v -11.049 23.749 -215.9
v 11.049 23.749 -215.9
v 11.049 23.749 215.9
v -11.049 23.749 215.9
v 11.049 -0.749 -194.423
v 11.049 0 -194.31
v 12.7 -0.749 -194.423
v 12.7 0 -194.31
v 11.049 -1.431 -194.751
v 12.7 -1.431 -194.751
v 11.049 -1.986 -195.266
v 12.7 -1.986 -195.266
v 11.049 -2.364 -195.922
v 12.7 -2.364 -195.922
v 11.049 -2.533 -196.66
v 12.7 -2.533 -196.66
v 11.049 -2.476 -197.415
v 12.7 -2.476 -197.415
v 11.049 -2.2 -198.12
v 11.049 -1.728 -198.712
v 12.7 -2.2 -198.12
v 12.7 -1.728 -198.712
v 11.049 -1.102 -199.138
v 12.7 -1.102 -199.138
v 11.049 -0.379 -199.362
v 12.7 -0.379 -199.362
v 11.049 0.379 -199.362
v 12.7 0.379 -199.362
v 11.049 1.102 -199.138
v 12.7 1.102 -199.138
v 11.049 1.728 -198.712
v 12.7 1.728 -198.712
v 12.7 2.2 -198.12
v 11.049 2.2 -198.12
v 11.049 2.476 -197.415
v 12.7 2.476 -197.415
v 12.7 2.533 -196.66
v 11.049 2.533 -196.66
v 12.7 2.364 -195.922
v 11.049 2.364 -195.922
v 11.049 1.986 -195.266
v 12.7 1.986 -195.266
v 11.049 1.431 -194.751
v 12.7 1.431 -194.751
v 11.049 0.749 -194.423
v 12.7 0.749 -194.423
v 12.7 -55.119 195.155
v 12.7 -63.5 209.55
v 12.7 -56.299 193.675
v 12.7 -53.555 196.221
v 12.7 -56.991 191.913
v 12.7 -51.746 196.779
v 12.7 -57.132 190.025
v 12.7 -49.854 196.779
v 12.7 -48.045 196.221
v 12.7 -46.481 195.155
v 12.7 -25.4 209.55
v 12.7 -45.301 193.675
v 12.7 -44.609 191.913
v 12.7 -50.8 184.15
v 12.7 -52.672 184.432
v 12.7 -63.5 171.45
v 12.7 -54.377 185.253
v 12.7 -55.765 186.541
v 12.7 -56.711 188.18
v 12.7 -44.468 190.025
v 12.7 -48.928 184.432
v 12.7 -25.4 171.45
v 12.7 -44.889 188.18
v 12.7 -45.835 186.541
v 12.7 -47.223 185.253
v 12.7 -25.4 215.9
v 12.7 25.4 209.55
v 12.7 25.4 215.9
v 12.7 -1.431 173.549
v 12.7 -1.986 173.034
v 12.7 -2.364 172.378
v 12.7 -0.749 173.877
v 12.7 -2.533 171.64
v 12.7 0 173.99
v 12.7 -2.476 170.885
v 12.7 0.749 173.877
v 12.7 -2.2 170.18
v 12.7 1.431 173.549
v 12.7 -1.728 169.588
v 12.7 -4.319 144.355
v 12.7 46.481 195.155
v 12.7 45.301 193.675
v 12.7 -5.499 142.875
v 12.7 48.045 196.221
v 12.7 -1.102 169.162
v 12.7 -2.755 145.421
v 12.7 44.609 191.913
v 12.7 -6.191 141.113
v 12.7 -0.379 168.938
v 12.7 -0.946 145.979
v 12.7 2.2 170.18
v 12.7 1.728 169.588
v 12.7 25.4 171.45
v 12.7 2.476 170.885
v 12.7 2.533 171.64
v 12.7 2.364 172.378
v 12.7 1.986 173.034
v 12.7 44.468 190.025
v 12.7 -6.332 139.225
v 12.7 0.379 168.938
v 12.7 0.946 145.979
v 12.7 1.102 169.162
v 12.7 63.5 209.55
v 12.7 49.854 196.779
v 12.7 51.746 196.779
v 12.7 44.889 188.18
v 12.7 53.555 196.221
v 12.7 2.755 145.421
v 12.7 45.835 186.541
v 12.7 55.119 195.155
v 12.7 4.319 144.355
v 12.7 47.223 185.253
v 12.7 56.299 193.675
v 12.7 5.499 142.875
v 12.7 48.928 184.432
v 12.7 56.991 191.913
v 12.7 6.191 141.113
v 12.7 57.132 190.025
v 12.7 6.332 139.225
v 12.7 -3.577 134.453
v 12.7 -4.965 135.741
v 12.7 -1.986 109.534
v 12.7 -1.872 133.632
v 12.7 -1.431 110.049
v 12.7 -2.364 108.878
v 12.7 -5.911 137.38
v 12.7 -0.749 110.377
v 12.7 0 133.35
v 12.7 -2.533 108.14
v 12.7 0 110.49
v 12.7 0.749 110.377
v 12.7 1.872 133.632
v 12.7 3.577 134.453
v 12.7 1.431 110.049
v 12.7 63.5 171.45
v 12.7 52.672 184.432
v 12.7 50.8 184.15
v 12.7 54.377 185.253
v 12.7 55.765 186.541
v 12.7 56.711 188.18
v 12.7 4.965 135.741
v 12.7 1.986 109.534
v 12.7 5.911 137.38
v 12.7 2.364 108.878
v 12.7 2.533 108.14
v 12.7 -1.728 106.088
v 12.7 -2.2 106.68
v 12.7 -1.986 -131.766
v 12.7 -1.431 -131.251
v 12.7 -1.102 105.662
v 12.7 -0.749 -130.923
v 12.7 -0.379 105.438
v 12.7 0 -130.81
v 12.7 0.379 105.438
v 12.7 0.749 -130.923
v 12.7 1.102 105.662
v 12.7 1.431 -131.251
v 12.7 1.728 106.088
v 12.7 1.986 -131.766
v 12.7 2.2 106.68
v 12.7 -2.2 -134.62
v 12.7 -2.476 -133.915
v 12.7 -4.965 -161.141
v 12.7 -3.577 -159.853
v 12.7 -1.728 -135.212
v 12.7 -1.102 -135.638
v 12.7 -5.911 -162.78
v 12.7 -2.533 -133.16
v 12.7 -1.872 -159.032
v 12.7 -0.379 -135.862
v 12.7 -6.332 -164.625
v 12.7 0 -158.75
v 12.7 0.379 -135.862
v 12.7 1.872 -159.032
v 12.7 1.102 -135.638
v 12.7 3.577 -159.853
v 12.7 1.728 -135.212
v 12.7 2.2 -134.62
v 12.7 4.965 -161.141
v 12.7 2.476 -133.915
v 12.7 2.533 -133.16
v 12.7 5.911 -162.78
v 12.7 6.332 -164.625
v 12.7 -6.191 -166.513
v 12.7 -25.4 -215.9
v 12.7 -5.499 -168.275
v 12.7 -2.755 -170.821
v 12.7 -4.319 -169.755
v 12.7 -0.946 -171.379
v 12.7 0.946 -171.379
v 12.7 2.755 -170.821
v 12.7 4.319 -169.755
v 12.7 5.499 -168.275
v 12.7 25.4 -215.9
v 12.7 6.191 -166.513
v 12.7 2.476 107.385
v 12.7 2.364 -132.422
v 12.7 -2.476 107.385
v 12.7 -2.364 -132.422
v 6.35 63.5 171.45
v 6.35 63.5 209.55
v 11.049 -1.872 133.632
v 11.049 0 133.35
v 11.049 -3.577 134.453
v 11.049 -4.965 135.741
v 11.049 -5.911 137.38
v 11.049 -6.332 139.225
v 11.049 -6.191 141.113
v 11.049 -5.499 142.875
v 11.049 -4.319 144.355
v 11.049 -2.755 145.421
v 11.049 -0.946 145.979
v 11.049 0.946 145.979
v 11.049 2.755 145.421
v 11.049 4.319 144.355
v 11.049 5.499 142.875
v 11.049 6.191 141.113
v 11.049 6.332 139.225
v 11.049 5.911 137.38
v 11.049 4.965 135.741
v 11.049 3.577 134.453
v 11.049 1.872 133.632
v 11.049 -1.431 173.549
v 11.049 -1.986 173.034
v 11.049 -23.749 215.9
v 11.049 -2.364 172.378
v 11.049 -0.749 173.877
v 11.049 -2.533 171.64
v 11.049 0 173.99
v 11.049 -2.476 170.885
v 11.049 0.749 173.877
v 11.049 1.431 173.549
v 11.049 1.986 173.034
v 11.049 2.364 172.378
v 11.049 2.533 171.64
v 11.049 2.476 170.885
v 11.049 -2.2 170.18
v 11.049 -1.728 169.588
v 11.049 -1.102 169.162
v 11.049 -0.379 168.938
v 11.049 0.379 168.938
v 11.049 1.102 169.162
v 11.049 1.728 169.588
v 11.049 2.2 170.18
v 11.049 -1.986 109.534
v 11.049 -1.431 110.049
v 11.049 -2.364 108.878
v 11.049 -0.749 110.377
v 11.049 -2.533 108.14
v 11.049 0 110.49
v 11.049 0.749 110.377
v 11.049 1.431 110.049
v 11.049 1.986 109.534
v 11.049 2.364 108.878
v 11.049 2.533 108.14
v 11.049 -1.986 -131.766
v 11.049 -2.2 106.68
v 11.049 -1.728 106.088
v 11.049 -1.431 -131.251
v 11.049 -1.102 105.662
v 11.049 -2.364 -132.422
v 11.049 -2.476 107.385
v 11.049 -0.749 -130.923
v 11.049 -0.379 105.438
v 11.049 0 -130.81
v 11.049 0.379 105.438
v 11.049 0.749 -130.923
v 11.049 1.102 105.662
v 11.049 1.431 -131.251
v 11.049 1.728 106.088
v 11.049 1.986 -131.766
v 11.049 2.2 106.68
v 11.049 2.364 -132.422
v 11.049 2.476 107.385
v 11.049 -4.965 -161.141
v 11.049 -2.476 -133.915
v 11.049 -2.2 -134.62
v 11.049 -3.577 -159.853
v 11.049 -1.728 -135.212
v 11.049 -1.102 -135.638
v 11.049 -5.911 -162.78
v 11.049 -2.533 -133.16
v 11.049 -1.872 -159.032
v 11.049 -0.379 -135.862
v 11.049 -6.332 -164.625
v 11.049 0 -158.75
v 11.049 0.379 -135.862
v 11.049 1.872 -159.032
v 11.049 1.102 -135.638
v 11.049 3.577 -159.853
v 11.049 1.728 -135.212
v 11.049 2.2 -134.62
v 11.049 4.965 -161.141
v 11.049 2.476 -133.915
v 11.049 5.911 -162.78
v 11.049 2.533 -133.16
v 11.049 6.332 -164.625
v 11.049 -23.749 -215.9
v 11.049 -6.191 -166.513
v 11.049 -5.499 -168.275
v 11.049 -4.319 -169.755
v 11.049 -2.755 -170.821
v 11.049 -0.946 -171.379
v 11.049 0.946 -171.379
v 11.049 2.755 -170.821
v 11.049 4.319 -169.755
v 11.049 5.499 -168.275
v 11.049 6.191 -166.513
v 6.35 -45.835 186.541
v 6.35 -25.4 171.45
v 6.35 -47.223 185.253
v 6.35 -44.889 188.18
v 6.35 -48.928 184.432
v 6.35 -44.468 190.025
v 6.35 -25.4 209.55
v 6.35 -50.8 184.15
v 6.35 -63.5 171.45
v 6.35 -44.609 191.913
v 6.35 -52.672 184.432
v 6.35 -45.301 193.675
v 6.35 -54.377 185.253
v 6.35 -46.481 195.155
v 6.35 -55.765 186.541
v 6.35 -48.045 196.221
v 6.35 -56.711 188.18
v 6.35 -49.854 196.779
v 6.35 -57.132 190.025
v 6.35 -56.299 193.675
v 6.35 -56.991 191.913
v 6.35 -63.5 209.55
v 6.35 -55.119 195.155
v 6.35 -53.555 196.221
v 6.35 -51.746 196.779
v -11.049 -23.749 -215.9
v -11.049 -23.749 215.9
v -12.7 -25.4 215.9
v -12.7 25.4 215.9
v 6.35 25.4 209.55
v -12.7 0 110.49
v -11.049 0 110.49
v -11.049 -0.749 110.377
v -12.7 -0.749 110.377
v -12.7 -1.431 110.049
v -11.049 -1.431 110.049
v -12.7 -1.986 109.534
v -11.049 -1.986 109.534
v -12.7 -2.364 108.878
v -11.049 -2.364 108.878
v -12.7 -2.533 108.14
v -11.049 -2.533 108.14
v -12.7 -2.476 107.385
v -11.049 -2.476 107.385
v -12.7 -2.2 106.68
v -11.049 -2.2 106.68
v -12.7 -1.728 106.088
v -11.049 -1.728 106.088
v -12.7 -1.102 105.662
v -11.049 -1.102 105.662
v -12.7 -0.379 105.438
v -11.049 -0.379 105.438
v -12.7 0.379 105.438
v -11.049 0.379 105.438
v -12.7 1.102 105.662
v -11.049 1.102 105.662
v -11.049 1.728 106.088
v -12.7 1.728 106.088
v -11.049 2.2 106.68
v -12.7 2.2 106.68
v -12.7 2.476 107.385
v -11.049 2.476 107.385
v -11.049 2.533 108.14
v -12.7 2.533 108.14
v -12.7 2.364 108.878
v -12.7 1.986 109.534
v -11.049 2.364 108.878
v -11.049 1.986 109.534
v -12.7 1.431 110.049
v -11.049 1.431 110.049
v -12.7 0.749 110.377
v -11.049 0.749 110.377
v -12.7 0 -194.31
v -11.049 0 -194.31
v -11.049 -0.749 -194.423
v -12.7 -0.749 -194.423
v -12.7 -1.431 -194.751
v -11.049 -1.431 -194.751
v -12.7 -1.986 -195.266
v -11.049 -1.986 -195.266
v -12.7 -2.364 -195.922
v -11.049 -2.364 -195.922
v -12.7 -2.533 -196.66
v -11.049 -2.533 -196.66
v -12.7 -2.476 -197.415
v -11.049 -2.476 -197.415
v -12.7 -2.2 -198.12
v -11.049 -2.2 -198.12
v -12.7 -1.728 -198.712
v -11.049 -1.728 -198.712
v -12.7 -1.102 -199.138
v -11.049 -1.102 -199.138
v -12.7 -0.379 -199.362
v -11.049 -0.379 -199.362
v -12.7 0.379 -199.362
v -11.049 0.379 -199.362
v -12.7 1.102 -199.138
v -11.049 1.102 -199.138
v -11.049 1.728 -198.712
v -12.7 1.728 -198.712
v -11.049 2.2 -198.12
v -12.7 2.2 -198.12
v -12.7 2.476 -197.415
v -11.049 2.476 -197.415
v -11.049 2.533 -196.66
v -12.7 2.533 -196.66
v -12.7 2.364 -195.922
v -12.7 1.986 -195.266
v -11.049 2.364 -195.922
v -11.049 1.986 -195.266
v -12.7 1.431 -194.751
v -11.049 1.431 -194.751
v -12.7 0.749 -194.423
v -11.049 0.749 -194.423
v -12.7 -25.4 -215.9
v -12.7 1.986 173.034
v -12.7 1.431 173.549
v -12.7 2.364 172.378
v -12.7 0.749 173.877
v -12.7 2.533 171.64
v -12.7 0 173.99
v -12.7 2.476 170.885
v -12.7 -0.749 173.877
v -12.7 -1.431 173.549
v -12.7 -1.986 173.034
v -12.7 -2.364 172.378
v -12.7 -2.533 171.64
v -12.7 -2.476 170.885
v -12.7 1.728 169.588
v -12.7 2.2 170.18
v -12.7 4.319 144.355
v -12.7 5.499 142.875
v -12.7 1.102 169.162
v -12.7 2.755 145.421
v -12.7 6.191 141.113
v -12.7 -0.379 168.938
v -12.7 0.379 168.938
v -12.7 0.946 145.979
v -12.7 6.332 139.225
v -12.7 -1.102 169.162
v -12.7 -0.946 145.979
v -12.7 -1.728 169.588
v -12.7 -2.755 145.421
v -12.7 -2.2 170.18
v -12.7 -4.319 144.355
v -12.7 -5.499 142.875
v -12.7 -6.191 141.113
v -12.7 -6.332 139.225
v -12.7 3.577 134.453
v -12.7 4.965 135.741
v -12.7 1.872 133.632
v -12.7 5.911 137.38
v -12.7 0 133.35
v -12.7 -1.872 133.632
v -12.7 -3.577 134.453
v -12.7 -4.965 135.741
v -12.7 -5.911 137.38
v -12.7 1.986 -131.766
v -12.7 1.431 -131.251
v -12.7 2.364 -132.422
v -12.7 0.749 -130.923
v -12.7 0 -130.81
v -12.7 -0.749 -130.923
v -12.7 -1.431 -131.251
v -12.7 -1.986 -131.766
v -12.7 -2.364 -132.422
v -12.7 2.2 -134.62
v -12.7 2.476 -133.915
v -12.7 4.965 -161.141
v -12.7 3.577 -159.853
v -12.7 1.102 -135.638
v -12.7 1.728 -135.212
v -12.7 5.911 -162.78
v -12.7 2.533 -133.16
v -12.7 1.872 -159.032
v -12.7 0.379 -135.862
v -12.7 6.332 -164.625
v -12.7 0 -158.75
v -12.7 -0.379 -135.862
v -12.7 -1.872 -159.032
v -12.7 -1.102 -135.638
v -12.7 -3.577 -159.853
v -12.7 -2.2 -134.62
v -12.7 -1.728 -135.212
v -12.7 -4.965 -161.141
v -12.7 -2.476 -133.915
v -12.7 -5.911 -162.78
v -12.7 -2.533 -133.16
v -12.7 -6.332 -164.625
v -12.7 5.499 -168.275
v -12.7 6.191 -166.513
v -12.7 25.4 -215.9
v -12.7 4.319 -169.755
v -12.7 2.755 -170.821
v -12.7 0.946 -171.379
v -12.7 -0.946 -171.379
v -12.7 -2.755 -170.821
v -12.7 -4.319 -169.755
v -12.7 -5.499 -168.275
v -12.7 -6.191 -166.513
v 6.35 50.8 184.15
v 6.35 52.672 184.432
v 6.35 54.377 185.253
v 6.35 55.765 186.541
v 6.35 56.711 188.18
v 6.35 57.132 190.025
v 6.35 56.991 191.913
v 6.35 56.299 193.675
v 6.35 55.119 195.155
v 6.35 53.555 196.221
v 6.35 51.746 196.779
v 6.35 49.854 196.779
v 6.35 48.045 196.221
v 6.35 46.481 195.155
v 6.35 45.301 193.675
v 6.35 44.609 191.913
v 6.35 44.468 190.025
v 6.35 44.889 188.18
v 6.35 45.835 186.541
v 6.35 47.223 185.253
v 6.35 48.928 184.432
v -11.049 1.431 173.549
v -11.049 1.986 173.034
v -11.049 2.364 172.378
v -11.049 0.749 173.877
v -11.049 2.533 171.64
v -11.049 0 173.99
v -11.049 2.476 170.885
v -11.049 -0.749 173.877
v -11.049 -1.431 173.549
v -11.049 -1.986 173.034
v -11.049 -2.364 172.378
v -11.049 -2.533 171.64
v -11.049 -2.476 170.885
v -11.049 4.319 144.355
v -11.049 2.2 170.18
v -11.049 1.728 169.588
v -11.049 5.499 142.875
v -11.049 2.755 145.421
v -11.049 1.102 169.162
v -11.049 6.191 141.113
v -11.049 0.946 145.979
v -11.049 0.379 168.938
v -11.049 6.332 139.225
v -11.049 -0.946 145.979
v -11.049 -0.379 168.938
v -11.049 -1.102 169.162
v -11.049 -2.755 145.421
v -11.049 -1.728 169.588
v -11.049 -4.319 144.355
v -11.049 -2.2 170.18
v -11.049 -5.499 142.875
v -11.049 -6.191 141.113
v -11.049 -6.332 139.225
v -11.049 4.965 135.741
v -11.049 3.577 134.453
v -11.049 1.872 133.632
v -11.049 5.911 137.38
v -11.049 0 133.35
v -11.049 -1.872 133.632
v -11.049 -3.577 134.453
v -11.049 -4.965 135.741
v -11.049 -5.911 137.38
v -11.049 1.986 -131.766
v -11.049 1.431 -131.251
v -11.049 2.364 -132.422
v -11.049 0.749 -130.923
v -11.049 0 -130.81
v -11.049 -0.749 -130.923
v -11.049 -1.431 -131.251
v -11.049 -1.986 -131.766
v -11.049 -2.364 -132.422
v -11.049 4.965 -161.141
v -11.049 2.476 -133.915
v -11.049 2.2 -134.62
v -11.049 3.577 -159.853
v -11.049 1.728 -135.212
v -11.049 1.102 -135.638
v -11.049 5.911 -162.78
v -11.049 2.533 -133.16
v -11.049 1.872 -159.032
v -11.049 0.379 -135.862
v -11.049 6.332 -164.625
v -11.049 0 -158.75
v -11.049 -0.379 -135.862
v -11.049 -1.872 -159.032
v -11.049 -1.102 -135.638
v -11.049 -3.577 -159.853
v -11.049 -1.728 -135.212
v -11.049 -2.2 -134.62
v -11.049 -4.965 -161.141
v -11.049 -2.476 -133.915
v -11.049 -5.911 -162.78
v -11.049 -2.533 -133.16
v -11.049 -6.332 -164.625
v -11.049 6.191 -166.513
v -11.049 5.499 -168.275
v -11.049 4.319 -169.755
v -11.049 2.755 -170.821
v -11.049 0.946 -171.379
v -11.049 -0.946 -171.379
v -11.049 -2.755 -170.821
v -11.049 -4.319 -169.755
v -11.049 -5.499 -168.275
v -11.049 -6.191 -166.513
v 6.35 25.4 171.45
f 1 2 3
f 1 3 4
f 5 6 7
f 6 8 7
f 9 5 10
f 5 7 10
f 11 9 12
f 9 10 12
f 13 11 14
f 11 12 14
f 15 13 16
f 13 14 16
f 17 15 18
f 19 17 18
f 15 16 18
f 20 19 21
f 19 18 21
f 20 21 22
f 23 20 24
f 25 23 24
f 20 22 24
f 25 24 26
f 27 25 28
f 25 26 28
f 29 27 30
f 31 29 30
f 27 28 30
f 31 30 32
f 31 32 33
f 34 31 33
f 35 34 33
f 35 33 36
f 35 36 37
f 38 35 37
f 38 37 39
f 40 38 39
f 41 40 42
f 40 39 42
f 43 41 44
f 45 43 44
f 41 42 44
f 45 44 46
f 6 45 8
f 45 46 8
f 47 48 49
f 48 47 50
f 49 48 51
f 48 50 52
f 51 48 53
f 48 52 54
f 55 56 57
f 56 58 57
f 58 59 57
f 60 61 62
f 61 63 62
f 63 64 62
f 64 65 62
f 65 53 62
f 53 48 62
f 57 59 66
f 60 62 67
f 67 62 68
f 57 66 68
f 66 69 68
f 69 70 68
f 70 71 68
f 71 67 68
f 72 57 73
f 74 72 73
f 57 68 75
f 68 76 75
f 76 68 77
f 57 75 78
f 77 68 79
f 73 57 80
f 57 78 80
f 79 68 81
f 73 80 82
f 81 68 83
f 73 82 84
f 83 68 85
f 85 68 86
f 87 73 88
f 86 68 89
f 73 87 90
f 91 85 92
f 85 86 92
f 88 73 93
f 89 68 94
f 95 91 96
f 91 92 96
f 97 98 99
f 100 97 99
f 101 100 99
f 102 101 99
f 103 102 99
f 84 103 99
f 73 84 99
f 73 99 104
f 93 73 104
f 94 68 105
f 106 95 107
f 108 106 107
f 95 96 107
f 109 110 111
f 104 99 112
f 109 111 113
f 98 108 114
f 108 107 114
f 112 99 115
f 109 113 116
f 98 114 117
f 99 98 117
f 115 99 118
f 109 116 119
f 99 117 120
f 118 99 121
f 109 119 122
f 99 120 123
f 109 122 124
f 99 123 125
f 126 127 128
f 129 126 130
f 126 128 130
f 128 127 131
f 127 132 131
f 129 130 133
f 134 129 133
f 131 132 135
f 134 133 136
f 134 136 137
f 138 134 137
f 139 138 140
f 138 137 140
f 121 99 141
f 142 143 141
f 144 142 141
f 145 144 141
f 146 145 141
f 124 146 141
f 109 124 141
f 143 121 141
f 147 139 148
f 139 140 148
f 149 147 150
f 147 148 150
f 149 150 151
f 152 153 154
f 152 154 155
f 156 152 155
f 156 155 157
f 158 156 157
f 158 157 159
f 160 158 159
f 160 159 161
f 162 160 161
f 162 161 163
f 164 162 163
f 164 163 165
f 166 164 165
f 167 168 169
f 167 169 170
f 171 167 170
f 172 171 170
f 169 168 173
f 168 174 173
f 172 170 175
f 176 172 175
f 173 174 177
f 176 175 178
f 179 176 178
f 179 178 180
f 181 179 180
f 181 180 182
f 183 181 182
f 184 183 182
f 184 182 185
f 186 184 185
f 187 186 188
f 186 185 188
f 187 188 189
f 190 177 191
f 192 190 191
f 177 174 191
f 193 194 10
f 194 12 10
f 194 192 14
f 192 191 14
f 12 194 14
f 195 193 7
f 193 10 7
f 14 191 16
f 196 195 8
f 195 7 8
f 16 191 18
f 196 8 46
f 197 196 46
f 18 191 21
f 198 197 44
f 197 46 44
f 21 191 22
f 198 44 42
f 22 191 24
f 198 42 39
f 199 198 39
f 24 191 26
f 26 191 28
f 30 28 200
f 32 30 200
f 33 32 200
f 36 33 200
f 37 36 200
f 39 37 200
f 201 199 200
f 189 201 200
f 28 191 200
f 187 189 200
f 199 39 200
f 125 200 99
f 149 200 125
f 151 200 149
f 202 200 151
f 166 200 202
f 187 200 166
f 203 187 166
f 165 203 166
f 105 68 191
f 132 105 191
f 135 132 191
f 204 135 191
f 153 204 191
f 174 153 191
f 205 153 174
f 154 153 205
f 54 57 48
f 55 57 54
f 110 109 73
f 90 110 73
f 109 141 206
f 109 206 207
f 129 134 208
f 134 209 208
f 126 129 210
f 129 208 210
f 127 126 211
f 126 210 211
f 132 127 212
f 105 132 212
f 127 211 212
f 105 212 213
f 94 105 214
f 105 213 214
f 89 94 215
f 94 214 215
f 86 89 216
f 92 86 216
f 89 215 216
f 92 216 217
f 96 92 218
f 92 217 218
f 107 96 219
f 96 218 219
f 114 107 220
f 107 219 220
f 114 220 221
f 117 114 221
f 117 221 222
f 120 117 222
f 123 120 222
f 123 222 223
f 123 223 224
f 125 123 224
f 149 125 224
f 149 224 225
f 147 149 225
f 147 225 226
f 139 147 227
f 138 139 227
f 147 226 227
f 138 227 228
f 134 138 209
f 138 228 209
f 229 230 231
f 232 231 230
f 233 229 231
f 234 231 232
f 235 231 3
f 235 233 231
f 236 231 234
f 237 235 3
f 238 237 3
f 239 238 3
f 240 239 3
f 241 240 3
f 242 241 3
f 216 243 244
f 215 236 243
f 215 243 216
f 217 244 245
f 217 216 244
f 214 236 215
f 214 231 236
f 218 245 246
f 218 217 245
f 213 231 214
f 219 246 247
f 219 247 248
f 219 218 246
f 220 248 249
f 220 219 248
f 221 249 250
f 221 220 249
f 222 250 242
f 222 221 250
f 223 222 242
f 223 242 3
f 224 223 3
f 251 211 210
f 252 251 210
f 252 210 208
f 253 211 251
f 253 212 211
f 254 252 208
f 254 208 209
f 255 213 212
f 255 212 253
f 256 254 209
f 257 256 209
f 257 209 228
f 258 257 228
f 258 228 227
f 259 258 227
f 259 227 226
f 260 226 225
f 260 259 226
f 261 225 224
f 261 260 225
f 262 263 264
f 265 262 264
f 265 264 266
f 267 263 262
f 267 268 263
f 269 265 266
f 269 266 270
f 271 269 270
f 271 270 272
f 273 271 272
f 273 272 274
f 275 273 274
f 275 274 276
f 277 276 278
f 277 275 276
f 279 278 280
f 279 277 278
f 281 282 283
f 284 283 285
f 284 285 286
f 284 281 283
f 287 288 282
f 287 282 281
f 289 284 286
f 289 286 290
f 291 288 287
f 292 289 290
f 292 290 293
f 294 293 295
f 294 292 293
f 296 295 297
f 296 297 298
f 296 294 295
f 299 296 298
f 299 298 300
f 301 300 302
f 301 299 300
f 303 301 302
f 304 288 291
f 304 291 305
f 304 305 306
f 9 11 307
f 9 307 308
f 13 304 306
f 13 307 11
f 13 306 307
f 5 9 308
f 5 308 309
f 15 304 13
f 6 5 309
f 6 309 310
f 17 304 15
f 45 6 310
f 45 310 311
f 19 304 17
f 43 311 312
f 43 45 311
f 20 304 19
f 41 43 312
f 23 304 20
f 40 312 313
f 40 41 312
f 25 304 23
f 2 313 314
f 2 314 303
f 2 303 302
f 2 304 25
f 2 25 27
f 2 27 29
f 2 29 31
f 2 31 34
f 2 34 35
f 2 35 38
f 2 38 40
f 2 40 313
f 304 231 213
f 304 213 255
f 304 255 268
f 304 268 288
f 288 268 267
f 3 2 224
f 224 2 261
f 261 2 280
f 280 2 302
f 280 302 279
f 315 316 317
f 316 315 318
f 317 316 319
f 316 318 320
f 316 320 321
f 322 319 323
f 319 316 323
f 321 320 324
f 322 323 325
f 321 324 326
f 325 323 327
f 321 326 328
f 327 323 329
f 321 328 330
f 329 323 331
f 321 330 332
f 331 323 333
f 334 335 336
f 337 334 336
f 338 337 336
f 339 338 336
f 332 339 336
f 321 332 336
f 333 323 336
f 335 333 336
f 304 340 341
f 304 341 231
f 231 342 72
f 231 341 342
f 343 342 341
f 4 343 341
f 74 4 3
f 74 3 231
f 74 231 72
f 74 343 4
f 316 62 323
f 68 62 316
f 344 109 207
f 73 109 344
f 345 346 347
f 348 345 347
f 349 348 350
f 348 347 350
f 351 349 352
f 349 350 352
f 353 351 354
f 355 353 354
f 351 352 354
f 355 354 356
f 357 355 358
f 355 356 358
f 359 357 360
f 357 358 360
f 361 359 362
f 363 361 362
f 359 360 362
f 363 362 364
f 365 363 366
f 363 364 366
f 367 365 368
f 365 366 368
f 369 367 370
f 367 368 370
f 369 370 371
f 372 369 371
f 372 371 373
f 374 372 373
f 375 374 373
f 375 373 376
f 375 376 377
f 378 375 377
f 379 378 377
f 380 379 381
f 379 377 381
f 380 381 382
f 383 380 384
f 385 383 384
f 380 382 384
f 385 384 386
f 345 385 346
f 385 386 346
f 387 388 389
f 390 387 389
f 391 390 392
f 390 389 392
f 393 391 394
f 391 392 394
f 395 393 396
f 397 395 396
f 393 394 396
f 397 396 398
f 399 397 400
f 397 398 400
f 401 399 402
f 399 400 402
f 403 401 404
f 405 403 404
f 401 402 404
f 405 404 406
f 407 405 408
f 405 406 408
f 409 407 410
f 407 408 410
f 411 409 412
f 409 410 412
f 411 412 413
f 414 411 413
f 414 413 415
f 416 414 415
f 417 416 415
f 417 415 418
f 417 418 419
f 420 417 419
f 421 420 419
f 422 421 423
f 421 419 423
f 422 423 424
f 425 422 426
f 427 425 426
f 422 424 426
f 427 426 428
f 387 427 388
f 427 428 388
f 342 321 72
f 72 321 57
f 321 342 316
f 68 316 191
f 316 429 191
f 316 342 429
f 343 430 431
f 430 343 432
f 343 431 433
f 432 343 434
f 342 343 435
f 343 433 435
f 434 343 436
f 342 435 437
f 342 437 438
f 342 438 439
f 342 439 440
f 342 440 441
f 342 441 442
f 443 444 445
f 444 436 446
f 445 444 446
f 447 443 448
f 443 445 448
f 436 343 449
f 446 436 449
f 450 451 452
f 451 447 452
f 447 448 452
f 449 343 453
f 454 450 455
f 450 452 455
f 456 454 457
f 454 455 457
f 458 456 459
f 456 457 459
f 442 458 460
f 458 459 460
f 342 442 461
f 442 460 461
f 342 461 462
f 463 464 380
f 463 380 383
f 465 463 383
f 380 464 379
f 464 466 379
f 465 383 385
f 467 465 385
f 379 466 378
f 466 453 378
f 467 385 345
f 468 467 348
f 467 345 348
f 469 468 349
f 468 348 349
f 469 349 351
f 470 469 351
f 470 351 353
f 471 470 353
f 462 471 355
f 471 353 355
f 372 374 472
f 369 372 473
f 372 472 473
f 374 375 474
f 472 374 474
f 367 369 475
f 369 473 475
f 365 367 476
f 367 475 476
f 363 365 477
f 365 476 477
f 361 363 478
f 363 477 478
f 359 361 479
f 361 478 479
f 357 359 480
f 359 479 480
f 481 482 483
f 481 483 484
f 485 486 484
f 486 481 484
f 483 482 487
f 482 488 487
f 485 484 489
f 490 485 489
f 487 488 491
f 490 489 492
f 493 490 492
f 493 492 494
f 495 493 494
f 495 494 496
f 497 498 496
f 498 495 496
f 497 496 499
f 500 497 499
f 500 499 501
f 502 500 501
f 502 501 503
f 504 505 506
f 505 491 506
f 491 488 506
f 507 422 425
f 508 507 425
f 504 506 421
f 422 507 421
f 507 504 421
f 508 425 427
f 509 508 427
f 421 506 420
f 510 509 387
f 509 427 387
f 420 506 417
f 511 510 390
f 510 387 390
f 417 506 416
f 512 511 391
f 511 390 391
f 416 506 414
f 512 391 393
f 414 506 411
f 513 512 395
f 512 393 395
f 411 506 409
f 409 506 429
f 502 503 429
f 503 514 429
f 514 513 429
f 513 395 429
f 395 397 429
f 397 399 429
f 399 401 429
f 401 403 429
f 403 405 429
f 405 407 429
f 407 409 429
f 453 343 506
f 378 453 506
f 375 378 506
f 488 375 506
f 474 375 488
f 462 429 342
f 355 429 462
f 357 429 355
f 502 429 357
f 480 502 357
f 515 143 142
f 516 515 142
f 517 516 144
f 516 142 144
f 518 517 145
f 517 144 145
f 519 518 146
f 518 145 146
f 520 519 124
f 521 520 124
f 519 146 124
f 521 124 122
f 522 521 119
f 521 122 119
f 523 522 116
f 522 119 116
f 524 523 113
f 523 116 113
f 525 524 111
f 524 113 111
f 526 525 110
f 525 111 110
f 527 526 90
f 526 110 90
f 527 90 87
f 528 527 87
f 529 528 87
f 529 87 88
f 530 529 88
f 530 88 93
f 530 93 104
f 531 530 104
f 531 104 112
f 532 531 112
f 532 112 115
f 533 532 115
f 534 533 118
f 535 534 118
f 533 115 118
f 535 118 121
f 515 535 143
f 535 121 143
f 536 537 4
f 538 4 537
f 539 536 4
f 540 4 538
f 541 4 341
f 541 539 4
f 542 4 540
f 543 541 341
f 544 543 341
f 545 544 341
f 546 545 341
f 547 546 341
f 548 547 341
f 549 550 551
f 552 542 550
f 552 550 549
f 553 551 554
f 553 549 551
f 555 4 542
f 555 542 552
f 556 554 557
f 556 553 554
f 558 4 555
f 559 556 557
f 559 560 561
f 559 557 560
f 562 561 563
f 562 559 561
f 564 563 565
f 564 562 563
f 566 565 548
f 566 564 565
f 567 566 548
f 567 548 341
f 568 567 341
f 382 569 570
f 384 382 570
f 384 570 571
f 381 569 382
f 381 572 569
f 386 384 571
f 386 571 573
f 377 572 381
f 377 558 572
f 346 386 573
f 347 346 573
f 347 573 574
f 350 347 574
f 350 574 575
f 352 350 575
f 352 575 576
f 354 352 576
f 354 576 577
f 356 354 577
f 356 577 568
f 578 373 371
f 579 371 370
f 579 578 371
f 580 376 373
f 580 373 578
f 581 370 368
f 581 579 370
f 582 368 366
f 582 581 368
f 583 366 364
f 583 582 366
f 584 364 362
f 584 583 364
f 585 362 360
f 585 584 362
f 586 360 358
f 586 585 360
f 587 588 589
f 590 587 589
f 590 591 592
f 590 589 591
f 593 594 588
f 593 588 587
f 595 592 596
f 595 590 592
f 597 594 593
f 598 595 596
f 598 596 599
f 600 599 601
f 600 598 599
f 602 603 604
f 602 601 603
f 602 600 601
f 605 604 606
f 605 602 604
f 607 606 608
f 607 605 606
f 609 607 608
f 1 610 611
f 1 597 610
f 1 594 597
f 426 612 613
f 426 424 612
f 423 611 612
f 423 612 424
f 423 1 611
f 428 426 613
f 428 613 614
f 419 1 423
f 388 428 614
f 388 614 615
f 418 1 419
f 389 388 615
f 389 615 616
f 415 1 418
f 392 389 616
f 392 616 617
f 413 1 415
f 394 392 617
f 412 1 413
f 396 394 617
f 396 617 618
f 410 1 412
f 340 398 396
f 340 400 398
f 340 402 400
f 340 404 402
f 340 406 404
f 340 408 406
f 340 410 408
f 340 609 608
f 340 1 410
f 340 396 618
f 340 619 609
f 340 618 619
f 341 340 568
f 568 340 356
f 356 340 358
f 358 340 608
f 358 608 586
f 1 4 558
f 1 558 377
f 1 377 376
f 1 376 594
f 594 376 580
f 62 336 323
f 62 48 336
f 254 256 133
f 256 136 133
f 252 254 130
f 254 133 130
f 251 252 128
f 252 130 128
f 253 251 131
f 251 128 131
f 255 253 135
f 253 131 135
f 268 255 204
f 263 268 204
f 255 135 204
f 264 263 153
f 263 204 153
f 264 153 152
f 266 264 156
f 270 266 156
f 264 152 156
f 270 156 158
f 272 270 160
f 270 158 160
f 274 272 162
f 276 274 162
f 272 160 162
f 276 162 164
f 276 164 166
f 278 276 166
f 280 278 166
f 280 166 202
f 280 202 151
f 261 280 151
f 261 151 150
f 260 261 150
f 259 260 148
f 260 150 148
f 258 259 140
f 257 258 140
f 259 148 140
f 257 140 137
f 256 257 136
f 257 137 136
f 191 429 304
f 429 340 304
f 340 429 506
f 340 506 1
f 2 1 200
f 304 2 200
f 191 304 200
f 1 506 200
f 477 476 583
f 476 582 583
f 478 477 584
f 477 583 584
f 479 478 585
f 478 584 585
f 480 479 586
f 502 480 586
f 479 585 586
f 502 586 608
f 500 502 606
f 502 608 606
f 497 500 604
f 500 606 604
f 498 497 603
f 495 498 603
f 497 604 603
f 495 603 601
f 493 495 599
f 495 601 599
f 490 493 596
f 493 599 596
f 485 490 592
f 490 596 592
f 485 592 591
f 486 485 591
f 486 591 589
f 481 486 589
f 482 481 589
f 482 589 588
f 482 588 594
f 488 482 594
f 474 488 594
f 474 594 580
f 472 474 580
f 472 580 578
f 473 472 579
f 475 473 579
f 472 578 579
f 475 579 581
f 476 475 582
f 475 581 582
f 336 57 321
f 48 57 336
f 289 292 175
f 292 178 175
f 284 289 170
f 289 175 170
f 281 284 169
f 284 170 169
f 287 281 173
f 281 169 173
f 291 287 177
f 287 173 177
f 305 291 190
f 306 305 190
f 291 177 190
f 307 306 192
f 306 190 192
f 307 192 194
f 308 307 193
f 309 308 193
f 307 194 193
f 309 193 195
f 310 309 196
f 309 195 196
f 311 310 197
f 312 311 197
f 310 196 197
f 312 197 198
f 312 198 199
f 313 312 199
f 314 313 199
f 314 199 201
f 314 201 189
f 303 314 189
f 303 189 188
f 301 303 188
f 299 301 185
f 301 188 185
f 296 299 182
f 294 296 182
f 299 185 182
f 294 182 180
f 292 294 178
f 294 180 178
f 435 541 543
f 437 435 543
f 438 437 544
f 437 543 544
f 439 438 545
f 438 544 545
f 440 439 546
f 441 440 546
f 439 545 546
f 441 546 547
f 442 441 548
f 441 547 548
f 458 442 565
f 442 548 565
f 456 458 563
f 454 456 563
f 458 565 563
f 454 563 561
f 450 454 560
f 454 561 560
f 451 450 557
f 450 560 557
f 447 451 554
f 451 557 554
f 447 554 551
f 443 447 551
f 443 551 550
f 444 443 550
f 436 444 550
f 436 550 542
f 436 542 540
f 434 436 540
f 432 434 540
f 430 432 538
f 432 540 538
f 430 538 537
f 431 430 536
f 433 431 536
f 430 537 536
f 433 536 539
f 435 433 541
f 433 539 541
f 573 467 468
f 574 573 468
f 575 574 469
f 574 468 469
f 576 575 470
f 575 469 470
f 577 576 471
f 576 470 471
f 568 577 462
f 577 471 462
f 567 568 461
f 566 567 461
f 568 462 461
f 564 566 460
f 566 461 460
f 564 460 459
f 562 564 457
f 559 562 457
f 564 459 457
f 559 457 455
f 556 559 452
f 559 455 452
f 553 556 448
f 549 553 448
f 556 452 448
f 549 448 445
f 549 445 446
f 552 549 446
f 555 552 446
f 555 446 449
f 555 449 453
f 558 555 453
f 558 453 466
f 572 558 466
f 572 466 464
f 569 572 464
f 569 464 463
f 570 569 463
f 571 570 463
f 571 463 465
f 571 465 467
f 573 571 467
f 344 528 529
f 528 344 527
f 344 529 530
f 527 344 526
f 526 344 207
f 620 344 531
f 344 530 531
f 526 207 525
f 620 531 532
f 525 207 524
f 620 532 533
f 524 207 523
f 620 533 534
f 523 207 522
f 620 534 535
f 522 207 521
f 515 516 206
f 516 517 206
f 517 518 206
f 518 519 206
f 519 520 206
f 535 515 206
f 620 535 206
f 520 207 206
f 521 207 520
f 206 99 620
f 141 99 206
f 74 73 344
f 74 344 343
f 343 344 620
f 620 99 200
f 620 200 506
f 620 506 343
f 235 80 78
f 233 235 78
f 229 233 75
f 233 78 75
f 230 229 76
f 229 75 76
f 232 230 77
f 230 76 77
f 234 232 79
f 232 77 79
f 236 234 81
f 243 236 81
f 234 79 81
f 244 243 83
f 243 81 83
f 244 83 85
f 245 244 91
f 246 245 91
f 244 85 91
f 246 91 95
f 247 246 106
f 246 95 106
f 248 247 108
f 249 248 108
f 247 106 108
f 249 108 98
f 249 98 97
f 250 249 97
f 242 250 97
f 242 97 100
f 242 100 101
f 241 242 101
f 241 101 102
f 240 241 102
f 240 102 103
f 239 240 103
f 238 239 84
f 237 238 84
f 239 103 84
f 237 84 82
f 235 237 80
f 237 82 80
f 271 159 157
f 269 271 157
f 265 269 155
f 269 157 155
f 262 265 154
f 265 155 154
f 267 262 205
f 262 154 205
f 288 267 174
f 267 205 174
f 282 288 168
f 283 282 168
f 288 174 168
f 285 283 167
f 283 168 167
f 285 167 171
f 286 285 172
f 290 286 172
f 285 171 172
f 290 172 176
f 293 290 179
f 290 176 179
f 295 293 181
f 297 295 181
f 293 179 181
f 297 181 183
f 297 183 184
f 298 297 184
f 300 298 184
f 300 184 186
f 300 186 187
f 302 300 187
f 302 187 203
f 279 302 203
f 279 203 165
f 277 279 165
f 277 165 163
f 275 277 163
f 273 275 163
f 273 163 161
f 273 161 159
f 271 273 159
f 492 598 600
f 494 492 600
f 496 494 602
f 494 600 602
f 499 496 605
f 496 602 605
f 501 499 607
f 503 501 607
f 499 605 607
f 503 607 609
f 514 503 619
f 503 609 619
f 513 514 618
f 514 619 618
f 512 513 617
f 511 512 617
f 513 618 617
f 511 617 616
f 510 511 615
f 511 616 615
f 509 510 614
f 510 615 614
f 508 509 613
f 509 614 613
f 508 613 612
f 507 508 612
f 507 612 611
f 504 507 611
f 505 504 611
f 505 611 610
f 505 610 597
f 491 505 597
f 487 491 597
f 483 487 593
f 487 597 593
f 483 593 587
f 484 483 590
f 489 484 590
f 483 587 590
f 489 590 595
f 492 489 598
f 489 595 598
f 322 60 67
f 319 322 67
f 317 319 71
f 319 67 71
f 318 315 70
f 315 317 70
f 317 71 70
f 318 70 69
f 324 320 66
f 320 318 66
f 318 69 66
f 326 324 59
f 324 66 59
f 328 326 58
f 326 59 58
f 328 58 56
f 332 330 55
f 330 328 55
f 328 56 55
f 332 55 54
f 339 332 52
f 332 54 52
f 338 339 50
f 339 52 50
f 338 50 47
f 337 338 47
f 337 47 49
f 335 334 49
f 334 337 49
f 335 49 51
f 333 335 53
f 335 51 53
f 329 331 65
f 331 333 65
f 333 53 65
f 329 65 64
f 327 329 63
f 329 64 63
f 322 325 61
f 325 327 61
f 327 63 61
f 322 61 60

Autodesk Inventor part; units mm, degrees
ref_plane "XY Plane" through (0, 0, 0) normal (0, 0, 1) x (1, 0, 0)
sketch "Sketch1" plane through (0, 0, 0) normal (0, 0, 1) x (1, 0, 0)
  line L0 (-12.7, -25.4) -> (12.7, -25.4)
  line L1 (12.7, -25.4) -> (12.7, 25.4)
  line L2 (12.7, 25.4) -> (-12.7, 25.4)
  line L3 (-12.7, 25.4) -> (-12.7, -25.4)
  line L4 (-12.7, -25.4) -> (12.7, 25.4) construction
  line L5 (12.7, -25.4) -> (-12.7, 25.4) construction
  line L6 (-11.049, -23.749) -> (11.049, -23.749)
  line L7 (11.049, -23.749) -> (11.049, 23.749)
  line L8 (11.049, 23.749) -> (-11.049, 23.749)
  line L9 (-11.049, 23.749) -> (-11.049, -23.749)
  line L10 (-11.049, -23.749) -> (11.049, 23.749) construction
  line L11 (11.049, -23.749) -> (-11.049, 23.749) construction
  point P0 (0, 0)
  dimension "d0" = 25.4
  dimension "d1" = 50.8
  dimension "d4" = 22.098
  dimension "d5" = 47.498
extrude "Extrusion2" add sketch "Sketch1" along normal mid plane 431.8
sketch "Sketch2" plane through (12.7, -25.4, 215.9) normal (1, 0, 0) x (0, 0, -1)
  line L0 (431.8, 50.8) -> (0, 50.8) projected
  line L1 (0, 0) -> (0, 50.8) projected
  line L2 (431.8, 0) -> (0, 0) projected
  line L3 (431.8, 50.8) -> (431.8, 0) projected
  point P0 (215.9, 25.4)
  point P1 (76.2, 25.4)
  dimension "d8" = 76.2
  dimension "d9" = 25.4
hole "Hole1" at (12.7, 0, 139.7) direction (-1, 0, 0) diameter 12.7 end through all
ref_plane "Work Plane1" through (-12.7, -25.4, 215.9) normal (-1, 0, 0) x (0, 0, 1)
ref_plane "Work Plane2" through (12.7, -25.4, 215.9) normal (-1, 0, 0) x (0, 0, 1)
sketch "Sketch4" plane through (-12.7, -25.4, 215.9) normal (-1, 0, 0) x (0, 0, 1)
  circle A0 centre (-76.2, 25.4) radius 6.35 projected
  line L0 (0, 0) -> (-431.8, 0) projected
  line L1 (0, 50.8) -> (0, 0) projected
  line L2 (-431.8, 50.8) -> (0, 50.8) projected
  line L3 (-431.8, 0) -> (-431.8, 50.8) projected
  point P0 (-215.9, 25.4)
  point P1 (-381, 25.4)
  dimension "d29" = 50.8
  dimension "d30" = 25.4
hole "Hole3" at (-12.7, 0, -165.1) direction (1, 0, 0) diameter 12.7 end through all
sketch "Sketch5" plane through (-12.7, -25.4, 215.9) normal (-1, 0, 0) x (0, 0, 1)
  circle A0 centre (-381, 25.4) radius 6.35 projected
  circle A1 centre (-76.2, 25.4) radius 6.35 projected
  line L0 (0, 0) -> (-431.8, 0) projected
  line L1 (0, 50.8) -> (0, 0) projected
  line L2 (-431.8, 50.8) -> (0, 50.8) projected
  line L3 (-431.8, 0) -> (-431.8, 50.8) projected
  point P0 (-215.9, 25.4)
  point P1 (-412.75, 25.4)
  point P2 (-349.25, 25.4)
  dimension "d38" = 31.75
  dimension "d39" = 63.5
hole "Hole4" at (-12.7, 0, -133.35) at (-12.7, 0, -196.85) direction (1, 0, 0) diameter 5.08 end through all
ref_plane "Work Plane3" through (-12.7, 25.4, 215.9) normal (0, 1, 0) x (1, 0, 0)
sketch "Sketch6" plane through (12.7, -25.4, 215.9) normal (1, 0, 0) x (0, 0, -1)
  circle A0 centre (412.75, 25.4) radius 2.54 projected
  circle A1 centre (349.25, 25.4) radius 2.54 projected
  circle A2 centre (381, 25.4) radius 6.35 projected
  circle A3 centre (76.2, 25.4) radius 6.35 projected
  line L0 (431.8, 50.8) -> (0, 50.8) projected
  line L1 (0, 0) -> (0, 50.8) projected
  line L2 (431.8, 0) -> (0, 0) projected
  line L3 (431.8, 50.8) -> (431.8, 0) projected
  circle A4 centre (25.4, 76.2) radius 6.35
  line L4 (6.35, 50.8) -> (44.45, 50.8)
  line L5 (44.45, 50.8) -> (44.45, 88.9)
  line L6 (44.45, 88.9) -> (6.35, 88.9)
  line L7 (6.35, 88.9) -> (6.35, 50.8)
  point P0 (215.9, 25.4)
  dimension "d48" = 12.7
  dimension "d49" = 25.4
  dimension "d50" = 25.4
  dimension "d51" = 38.1
  dimension "d52" = 38.1
  dimension "d53" = 19.05
extrude "Extrusion3" add sketch "Sketch6" against normal blind 6.35 contours L0 L7 L6 L5
mirror "Mirror2" about plane through (0, 0, 0) normal (0, 1, 0) of "Extrusion3"
pattern_linear "Rectangular Pattern1" count 2 spacing 304.8 along (0, 0, 1) of "Hole4"
properties part number "Steel 4130 1x2in. Tubing, t=.065in.,L=22in." material "Steel"
